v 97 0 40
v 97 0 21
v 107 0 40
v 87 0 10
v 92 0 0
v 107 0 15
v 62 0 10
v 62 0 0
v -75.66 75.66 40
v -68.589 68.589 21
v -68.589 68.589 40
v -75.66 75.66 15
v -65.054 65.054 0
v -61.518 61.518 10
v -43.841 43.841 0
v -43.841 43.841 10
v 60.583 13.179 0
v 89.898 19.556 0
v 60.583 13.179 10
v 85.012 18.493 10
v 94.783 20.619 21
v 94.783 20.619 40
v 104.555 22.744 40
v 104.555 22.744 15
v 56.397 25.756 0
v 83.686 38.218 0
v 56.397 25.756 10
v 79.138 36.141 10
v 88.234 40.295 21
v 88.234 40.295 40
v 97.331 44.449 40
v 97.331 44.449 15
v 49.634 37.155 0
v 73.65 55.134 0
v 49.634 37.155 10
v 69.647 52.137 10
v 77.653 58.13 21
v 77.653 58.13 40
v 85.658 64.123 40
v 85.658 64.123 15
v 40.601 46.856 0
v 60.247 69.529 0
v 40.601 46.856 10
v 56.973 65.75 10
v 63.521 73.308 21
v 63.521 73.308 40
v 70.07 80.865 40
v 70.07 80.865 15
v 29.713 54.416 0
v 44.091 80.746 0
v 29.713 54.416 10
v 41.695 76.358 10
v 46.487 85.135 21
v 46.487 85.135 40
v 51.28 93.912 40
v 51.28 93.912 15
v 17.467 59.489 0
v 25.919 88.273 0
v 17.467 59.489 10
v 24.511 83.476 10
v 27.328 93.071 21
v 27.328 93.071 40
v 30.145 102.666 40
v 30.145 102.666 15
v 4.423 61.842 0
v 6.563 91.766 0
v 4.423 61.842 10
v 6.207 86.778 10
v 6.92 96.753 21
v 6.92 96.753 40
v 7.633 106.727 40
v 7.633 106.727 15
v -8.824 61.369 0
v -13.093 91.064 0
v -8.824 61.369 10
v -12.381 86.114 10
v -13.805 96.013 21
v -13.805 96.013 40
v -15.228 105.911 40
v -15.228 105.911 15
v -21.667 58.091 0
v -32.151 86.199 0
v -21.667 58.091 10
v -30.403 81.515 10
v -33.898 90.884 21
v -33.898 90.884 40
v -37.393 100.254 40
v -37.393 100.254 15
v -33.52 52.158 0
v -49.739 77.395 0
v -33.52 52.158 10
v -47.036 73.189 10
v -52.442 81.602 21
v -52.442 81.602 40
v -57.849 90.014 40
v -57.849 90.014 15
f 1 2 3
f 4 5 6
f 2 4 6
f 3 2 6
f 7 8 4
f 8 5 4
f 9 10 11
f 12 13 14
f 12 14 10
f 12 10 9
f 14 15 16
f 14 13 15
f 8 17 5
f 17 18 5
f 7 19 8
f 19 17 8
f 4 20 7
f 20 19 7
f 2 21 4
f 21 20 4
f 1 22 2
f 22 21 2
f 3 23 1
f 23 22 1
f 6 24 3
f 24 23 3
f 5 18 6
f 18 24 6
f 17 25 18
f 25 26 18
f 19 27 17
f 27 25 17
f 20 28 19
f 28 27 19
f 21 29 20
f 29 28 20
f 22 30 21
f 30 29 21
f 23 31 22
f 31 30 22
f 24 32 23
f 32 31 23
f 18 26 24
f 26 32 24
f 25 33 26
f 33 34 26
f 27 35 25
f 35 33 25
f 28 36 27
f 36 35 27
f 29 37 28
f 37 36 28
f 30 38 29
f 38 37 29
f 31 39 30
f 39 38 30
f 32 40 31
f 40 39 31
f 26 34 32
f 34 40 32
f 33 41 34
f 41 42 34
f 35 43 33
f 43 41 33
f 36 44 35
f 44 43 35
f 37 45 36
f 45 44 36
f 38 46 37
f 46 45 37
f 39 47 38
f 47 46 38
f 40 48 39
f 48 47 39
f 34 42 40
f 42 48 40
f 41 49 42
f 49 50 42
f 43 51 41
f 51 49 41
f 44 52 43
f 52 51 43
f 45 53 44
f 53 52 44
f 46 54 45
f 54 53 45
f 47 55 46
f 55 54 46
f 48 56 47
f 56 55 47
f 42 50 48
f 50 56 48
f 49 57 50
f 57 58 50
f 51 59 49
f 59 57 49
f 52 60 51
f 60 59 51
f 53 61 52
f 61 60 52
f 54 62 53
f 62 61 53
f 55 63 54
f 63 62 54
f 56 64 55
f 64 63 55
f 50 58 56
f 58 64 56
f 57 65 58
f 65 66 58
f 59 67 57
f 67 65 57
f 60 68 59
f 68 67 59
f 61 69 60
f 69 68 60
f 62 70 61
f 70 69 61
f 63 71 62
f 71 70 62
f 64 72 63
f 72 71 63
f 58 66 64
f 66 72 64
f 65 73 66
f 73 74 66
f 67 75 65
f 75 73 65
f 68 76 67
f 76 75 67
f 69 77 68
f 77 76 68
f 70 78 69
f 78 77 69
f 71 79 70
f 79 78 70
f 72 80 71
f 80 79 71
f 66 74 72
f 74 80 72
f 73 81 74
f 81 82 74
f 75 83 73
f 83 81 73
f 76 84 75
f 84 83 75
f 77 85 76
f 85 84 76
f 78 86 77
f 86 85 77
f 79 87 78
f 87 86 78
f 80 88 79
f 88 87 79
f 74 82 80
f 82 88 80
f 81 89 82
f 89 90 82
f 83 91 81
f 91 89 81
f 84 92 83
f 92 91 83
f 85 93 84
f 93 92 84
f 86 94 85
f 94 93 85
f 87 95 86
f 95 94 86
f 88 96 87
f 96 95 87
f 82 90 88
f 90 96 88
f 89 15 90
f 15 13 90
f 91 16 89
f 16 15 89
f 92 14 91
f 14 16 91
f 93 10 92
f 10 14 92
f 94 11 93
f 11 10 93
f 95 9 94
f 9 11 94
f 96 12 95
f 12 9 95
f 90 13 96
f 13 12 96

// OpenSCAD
echo(version=version());

// rotate_extrude() always rotates the 2D shape 360 degrees
// around the Z axis. Note that the 2D shape must be either
// completely on the positive or negative side of the X axis.
//color("red")
//    rotate_extrude(angle=180)
//        translate([62, 0])
//            square([25,10]);

//color("blue")
//    rotate_extrude()
//        polygon([
//            [77, 0],
//            [99, 20],
//            [99, 40],
//            [77, 10]]);


color("green")
    rotate_extrude(angle=135)
        translate([62, 0])
            polygon([
                [0, 0],
                [30, 0],
                [45, 15],
                [45, 40],
                [35, 40],
                [35, 21],
                [25, 10],
                [0, 10]]);
